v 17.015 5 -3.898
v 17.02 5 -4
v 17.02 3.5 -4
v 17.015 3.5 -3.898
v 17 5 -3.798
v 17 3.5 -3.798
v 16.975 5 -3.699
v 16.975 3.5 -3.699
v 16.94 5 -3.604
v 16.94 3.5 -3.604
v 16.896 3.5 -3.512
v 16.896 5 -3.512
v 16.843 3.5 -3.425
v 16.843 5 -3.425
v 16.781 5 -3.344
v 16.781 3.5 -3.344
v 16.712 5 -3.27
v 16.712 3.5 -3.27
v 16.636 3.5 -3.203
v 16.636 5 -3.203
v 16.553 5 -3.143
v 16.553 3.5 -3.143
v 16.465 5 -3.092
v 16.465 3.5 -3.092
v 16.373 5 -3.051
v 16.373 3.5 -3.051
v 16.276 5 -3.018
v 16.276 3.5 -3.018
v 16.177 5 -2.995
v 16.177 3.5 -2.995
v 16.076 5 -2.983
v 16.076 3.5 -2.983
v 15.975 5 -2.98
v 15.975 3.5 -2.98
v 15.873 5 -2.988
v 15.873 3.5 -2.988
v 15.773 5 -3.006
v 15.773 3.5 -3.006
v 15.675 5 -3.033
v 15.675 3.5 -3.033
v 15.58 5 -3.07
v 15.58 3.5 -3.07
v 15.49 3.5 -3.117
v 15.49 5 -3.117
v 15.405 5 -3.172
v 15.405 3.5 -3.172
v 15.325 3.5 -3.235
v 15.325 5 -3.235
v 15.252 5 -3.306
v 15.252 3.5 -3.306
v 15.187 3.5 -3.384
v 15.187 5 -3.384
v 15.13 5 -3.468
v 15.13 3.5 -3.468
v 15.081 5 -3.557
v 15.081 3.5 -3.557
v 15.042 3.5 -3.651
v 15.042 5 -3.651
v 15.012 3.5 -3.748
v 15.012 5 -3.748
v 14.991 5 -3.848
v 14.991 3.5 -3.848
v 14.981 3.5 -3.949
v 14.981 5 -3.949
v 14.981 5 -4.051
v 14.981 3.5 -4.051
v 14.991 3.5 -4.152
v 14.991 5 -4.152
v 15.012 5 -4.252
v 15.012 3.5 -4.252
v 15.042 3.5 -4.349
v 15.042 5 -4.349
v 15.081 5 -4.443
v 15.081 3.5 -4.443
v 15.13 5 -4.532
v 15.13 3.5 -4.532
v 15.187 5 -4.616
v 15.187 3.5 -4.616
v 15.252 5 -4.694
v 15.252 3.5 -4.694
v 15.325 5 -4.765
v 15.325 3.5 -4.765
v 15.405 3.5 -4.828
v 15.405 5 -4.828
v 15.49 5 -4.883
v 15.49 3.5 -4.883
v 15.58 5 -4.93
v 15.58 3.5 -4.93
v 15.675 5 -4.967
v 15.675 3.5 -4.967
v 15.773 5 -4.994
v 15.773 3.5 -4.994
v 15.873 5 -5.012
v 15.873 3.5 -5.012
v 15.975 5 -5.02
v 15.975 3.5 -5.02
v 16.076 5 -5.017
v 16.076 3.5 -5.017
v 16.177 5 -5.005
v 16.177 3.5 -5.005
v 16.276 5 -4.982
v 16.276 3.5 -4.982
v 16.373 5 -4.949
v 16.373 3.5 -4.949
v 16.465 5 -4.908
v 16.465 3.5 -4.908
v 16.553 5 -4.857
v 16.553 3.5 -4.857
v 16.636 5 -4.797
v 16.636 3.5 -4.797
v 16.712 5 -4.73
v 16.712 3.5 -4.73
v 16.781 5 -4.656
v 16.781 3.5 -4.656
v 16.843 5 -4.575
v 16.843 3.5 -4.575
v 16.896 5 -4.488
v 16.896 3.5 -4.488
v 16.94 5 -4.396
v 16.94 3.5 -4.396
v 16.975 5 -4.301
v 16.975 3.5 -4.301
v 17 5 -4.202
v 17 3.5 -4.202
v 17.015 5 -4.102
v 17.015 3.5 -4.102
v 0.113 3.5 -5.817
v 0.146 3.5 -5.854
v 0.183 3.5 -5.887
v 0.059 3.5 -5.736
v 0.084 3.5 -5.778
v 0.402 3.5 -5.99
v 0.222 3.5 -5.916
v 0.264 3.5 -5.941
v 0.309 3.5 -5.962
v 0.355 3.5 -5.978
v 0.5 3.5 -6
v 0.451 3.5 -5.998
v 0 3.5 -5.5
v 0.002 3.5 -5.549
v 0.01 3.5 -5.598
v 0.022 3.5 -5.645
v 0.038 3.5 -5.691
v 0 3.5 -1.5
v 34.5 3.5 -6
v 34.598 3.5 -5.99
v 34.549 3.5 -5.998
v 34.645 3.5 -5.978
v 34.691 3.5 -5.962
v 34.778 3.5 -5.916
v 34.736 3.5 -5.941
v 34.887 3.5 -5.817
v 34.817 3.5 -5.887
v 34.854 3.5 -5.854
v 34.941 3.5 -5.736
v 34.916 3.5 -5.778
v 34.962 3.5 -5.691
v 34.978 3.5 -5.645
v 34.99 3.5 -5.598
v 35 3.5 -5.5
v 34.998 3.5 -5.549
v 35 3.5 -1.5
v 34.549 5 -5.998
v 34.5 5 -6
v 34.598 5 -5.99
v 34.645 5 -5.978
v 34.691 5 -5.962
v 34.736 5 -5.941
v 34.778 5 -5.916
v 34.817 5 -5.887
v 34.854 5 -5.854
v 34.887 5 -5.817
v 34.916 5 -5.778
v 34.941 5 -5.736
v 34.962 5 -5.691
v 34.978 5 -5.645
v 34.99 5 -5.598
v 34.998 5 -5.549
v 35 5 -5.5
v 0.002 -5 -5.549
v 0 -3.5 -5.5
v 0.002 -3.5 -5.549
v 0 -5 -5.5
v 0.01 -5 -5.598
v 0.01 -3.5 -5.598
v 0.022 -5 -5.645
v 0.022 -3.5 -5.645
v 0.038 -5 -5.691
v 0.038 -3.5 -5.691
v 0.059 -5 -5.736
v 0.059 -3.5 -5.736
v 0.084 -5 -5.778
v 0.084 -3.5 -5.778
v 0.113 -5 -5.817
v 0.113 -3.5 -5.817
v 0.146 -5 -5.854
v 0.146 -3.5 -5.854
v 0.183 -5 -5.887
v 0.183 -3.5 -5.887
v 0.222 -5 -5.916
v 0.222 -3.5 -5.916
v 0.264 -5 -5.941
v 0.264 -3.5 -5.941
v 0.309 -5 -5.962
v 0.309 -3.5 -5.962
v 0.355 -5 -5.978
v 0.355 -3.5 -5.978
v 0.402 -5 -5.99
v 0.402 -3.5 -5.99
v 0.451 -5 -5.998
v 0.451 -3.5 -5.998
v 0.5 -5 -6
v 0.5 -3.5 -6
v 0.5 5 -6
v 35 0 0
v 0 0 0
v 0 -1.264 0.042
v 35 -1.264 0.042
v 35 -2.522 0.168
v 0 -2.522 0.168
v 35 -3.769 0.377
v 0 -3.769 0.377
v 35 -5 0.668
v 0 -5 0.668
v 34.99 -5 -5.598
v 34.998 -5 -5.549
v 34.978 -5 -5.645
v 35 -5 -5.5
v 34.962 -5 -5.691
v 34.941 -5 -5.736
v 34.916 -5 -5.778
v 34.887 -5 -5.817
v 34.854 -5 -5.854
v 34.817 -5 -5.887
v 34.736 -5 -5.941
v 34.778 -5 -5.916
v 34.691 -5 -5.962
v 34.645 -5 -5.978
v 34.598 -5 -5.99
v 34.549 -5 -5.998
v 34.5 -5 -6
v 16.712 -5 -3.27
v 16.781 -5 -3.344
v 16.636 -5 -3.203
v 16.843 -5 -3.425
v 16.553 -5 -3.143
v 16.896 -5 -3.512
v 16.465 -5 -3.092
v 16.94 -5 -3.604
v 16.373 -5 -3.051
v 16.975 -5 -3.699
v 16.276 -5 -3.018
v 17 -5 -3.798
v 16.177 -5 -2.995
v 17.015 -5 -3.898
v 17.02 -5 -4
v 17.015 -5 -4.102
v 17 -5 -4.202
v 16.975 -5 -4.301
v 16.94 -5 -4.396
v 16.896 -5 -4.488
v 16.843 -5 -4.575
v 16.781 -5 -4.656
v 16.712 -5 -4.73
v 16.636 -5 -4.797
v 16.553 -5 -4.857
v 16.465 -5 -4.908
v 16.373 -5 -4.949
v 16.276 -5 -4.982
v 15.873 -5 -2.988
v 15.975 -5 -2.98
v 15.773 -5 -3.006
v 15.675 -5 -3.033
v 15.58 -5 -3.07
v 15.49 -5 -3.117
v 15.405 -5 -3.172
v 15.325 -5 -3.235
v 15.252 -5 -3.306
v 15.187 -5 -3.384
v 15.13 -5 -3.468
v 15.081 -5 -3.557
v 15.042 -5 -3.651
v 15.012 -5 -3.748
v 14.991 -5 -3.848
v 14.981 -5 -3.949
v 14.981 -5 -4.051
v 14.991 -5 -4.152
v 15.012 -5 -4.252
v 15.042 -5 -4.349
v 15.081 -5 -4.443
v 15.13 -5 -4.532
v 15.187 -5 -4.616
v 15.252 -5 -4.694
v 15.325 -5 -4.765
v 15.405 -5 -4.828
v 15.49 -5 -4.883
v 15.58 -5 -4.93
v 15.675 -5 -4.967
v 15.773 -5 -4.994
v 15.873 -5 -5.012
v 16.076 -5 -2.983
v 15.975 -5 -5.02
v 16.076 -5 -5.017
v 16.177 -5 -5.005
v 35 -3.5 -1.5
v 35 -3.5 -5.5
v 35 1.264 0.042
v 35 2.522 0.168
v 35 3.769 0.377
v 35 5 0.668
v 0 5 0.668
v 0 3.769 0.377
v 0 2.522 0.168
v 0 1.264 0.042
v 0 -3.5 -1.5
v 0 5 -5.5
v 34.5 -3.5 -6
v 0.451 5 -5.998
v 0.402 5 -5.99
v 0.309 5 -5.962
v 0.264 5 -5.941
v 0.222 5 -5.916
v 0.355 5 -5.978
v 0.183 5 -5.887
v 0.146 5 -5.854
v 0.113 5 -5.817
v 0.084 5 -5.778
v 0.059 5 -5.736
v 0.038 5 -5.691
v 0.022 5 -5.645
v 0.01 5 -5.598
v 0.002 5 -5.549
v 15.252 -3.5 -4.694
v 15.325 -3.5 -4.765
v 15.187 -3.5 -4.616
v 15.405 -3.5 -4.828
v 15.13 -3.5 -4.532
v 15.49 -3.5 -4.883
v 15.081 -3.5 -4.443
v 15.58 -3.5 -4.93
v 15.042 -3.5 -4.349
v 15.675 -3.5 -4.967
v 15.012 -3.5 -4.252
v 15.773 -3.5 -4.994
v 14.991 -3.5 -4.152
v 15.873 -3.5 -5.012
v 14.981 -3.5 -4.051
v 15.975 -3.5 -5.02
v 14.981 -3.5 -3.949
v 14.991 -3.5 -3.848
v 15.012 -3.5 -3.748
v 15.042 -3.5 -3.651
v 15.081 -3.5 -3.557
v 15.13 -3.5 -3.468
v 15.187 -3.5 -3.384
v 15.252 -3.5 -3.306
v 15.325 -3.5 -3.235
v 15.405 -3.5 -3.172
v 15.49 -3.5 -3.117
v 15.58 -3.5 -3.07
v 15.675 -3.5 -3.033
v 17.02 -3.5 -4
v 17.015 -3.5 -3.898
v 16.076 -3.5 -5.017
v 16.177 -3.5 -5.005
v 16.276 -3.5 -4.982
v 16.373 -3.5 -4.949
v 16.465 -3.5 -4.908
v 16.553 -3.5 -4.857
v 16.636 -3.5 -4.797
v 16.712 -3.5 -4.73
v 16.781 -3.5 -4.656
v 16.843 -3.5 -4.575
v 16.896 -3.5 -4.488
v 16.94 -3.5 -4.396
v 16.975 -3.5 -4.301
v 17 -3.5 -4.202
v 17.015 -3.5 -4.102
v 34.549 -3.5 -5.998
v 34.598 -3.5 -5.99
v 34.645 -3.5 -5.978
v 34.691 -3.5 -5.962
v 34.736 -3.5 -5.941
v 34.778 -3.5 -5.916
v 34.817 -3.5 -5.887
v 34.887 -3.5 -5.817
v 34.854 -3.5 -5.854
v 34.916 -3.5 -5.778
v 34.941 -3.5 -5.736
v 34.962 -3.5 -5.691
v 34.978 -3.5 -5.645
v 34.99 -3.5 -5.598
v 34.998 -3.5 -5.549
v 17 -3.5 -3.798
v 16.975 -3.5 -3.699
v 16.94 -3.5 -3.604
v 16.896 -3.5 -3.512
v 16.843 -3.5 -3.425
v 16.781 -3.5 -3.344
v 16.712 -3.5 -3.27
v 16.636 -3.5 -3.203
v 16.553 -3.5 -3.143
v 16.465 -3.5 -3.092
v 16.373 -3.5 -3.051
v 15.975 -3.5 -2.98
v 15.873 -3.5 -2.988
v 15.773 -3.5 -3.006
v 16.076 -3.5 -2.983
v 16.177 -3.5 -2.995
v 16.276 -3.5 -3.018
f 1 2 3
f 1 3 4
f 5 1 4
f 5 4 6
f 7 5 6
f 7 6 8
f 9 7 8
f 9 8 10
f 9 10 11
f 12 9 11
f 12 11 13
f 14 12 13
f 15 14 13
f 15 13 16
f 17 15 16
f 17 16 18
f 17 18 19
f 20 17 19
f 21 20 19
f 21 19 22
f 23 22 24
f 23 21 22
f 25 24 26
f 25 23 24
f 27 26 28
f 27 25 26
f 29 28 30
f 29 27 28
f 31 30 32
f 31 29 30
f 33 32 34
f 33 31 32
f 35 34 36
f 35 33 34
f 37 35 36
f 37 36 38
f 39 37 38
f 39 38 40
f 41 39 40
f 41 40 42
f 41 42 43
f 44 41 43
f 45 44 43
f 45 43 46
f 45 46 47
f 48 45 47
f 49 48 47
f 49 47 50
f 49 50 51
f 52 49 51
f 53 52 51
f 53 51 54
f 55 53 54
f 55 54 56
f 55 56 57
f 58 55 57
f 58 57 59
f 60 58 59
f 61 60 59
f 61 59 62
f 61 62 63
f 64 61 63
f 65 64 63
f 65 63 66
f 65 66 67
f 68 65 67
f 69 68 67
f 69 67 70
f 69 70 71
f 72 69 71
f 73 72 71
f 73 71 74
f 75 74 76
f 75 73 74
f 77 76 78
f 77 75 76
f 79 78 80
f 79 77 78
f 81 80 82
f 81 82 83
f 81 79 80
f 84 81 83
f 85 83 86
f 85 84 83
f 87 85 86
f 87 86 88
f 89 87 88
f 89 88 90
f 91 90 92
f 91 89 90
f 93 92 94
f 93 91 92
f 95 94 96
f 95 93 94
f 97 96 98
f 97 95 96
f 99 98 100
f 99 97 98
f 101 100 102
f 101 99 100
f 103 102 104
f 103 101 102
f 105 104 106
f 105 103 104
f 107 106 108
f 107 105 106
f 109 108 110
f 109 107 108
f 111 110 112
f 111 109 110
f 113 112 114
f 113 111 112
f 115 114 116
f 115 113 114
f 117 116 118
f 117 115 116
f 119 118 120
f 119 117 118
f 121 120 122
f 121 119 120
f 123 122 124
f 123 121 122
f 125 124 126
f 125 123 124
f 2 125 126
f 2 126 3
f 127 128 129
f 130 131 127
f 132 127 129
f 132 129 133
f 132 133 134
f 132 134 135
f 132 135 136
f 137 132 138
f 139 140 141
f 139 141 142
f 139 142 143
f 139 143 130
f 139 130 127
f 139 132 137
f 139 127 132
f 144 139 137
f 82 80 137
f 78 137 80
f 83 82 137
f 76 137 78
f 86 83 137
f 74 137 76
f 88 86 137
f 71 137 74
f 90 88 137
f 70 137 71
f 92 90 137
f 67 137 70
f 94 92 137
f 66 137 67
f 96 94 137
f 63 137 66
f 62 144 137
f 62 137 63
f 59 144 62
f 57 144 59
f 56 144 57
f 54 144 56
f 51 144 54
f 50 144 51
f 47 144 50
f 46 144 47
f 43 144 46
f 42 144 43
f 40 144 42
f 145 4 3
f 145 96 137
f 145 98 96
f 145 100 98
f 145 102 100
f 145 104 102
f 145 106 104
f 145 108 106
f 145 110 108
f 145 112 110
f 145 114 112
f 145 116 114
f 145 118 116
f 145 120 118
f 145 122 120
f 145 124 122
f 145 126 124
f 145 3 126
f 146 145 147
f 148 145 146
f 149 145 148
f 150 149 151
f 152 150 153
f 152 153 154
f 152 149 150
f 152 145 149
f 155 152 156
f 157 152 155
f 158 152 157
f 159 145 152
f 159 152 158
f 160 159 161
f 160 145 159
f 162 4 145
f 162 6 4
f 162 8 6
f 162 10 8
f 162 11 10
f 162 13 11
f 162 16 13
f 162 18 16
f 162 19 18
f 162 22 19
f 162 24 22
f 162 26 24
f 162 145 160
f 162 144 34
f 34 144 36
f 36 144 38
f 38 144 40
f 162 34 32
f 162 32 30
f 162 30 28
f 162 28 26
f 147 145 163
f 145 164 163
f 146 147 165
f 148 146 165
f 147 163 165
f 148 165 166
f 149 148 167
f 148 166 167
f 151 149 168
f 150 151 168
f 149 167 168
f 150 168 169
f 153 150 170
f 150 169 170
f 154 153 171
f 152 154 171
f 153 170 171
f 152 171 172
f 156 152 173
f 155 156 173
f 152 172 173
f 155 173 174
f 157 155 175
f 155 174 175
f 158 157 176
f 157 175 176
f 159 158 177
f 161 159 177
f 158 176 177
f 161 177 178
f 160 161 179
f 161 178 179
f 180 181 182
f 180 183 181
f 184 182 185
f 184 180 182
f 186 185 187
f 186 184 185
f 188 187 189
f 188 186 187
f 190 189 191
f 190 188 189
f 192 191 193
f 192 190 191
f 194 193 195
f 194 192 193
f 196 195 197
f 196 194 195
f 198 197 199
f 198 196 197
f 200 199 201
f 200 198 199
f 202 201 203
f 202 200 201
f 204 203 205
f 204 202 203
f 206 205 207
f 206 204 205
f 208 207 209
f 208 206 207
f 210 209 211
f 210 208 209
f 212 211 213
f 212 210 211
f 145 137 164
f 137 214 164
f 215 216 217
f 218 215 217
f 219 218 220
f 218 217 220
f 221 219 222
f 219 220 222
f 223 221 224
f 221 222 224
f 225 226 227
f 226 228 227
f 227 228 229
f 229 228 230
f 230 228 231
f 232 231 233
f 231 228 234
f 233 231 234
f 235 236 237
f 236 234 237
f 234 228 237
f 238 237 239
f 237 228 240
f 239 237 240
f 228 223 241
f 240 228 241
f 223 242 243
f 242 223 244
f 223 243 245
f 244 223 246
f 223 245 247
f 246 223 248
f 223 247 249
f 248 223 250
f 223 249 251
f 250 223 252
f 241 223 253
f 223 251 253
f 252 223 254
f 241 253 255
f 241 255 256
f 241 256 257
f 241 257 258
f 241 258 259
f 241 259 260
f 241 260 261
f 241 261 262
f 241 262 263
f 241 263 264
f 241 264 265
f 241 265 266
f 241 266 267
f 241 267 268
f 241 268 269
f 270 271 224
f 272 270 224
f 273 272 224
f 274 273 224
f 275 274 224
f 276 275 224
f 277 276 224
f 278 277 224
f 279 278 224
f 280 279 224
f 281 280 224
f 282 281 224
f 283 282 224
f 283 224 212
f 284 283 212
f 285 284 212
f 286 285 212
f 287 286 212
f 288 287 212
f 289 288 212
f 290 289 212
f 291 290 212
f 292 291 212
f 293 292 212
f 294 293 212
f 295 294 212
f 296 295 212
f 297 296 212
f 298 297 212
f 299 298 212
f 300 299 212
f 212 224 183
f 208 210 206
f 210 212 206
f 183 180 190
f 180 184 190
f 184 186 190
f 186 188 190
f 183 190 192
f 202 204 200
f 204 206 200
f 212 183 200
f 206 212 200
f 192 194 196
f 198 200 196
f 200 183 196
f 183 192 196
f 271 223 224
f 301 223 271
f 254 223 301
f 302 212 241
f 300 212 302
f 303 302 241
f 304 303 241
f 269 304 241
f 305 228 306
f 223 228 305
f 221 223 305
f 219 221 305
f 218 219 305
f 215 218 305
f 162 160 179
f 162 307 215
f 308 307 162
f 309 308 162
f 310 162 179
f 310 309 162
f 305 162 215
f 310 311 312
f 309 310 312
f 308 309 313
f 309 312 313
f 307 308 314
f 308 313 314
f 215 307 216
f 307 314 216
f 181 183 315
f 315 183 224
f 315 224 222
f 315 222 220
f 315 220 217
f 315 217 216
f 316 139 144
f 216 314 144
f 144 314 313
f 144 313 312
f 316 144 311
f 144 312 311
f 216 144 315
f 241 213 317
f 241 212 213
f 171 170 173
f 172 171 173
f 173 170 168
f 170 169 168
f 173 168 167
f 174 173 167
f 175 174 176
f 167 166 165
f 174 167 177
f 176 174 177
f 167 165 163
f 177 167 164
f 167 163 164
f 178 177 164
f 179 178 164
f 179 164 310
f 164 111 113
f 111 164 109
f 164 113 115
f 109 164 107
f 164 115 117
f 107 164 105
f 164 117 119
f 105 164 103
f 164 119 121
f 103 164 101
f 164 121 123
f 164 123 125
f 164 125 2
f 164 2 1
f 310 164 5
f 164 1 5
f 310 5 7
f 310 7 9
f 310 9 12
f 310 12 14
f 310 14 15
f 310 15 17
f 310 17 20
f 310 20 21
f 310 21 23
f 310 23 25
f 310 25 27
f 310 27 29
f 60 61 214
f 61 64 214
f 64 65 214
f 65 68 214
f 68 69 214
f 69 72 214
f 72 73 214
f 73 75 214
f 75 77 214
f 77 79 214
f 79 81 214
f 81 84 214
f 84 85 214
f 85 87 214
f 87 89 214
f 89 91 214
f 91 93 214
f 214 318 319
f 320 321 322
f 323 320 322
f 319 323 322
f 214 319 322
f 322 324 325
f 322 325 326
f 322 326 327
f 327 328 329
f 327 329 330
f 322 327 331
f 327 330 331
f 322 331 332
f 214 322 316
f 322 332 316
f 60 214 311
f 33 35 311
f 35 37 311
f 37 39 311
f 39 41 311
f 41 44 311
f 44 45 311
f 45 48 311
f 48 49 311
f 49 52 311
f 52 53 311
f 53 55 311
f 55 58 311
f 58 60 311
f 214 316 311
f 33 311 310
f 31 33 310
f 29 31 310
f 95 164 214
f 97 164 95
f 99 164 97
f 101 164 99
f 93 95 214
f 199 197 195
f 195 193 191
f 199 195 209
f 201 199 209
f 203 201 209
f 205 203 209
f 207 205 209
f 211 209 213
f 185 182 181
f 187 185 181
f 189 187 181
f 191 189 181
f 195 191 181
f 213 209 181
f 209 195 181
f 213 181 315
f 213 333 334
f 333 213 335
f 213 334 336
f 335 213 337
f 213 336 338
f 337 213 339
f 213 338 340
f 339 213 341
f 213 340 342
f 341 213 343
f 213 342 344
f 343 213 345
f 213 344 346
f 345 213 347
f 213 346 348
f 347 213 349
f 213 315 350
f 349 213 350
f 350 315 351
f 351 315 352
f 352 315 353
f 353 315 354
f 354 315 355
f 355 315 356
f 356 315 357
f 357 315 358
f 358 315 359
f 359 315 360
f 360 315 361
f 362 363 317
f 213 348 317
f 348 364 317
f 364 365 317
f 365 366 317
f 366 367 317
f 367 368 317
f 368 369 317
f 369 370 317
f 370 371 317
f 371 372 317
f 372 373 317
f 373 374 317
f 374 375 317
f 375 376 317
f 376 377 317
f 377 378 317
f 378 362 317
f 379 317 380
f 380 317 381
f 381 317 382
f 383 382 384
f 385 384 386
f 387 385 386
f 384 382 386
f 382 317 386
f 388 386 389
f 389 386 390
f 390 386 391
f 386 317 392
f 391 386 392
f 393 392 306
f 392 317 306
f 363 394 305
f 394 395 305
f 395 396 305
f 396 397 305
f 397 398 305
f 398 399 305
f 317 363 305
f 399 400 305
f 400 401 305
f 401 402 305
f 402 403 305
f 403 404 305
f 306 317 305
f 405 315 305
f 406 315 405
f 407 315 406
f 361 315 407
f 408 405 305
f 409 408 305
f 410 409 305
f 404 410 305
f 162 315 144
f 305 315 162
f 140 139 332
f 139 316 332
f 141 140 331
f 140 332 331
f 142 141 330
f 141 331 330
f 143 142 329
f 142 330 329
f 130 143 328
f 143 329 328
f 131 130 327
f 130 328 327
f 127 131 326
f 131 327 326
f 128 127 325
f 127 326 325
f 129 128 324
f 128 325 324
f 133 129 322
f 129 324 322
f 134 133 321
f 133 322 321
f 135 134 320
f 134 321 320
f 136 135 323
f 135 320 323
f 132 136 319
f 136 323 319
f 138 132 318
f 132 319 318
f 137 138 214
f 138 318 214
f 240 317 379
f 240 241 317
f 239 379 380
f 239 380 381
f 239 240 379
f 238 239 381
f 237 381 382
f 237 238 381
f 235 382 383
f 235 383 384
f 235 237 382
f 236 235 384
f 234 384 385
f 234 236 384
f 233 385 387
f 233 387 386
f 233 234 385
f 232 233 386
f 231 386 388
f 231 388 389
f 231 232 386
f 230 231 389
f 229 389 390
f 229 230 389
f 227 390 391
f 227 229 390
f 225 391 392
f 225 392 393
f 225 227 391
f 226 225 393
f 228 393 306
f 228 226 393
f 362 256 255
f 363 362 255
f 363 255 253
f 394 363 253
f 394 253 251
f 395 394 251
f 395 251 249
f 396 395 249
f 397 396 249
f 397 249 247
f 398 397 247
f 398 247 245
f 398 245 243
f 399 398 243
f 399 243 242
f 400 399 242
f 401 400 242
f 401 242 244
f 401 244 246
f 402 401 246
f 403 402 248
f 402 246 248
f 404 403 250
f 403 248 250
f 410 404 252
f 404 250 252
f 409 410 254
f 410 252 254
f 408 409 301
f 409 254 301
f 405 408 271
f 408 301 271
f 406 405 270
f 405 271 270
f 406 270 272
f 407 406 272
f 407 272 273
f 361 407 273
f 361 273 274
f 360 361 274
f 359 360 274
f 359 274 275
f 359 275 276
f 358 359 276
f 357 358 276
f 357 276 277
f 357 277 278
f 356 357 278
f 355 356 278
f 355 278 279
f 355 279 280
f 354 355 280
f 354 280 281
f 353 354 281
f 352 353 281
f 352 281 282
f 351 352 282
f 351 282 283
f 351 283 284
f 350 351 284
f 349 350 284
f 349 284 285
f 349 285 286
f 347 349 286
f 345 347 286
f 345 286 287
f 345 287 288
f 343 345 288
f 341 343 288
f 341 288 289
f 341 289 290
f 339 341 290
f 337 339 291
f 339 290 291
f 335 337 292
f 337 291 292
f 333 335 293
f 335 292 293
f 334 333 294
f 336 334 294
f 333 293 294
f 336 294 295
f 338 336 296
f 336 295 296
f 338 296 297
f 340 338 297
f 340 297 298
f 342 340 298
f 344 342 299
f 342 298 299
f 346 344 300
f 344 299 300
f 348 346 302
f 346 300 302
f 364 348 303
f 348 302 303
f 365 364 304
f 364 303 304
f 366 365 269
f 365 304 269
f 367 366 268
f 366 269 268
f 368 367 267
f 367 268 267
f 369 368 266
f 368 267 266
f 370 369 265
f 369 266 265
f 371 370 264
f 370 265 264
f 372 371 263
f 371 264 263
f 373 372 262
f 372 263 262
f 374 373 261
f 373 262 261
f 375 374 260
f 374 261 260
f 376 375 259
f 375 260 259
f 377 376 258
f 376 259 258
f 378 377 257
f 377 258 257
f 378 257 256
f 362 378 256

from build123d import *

# Parameters (mm, degrees)
F0_W     = 35
F0_H     = 5
F1_DEPTH = 1.5
F2_W     = 35
F2_H     = 1.5
F3_DEPTH = 4.5
F4_R     = 1.02
F5_DEPTH = 5.001
F6_R     = 0.5
F9_DEPTH = 35


with BuildPart() as f1:
    # F0 (on Top) → F1 (new body)
    with BuildSketch(Plane.XY):
        with Locations((17.5, -2.5)):
            Rectangle(F0_W, F0_H)
    extrude(amount=-F1_DEPTH)

    # F2 (on face) → F3 (join)
    with BuildSketch(Plane(origin=(0, 0, -1.5), x_dir=(1, 0, 0), z_dir=(0, 0, -1))):
        with Locations((17.5, 4.25)):
            Rectangle(F2_W, F2_H)
    extrude(amount=F3_DEPTH)

    # F4 (on face) → F5 (cut, through all)
    with BuildSketch(Plane.XZ.offset(5)):
        with Locations((16, -4)):
            Circle(F4_R)
    extrude(amount=-F5_DEPTH, mode=Mode.SUBTRACT)

    # F6
    f6_edges = [f1.edges().sort_by_distance(p)[0] for p in [
        (35, -4.25, -6),
        (0, -4.25, -6),
    ]]
    fillet(f6_edges, radius=F6_R)

    # F7: F1 across plane


with BuildPart() as f1_1:
    add(f1.part)
    add(f1.part.mirror(Plane.XZ))

    # F8 (on Right) → F9 (join, through all)
    with BuildSketch(Plane.YZ):
        with BuildLine():
            ThreePointArc((0, 0), (-2.522204, 0.167707), (-5, 0.667876))
            Line((-5, 0.667876), (-5, 0))
            Line((-5, 0), (0, 0))
        make_face()
        with BuildLine():
            Line((5, 0), (5, 0.667876))
            ThreePointArc((5, 0.667876), (2.522204, 0.167707), (0, 0))
            Line((0, 0), (5, 0))
        make_face()
    extrude(amount=F9_DEPTH)


solid = f1_1.part
